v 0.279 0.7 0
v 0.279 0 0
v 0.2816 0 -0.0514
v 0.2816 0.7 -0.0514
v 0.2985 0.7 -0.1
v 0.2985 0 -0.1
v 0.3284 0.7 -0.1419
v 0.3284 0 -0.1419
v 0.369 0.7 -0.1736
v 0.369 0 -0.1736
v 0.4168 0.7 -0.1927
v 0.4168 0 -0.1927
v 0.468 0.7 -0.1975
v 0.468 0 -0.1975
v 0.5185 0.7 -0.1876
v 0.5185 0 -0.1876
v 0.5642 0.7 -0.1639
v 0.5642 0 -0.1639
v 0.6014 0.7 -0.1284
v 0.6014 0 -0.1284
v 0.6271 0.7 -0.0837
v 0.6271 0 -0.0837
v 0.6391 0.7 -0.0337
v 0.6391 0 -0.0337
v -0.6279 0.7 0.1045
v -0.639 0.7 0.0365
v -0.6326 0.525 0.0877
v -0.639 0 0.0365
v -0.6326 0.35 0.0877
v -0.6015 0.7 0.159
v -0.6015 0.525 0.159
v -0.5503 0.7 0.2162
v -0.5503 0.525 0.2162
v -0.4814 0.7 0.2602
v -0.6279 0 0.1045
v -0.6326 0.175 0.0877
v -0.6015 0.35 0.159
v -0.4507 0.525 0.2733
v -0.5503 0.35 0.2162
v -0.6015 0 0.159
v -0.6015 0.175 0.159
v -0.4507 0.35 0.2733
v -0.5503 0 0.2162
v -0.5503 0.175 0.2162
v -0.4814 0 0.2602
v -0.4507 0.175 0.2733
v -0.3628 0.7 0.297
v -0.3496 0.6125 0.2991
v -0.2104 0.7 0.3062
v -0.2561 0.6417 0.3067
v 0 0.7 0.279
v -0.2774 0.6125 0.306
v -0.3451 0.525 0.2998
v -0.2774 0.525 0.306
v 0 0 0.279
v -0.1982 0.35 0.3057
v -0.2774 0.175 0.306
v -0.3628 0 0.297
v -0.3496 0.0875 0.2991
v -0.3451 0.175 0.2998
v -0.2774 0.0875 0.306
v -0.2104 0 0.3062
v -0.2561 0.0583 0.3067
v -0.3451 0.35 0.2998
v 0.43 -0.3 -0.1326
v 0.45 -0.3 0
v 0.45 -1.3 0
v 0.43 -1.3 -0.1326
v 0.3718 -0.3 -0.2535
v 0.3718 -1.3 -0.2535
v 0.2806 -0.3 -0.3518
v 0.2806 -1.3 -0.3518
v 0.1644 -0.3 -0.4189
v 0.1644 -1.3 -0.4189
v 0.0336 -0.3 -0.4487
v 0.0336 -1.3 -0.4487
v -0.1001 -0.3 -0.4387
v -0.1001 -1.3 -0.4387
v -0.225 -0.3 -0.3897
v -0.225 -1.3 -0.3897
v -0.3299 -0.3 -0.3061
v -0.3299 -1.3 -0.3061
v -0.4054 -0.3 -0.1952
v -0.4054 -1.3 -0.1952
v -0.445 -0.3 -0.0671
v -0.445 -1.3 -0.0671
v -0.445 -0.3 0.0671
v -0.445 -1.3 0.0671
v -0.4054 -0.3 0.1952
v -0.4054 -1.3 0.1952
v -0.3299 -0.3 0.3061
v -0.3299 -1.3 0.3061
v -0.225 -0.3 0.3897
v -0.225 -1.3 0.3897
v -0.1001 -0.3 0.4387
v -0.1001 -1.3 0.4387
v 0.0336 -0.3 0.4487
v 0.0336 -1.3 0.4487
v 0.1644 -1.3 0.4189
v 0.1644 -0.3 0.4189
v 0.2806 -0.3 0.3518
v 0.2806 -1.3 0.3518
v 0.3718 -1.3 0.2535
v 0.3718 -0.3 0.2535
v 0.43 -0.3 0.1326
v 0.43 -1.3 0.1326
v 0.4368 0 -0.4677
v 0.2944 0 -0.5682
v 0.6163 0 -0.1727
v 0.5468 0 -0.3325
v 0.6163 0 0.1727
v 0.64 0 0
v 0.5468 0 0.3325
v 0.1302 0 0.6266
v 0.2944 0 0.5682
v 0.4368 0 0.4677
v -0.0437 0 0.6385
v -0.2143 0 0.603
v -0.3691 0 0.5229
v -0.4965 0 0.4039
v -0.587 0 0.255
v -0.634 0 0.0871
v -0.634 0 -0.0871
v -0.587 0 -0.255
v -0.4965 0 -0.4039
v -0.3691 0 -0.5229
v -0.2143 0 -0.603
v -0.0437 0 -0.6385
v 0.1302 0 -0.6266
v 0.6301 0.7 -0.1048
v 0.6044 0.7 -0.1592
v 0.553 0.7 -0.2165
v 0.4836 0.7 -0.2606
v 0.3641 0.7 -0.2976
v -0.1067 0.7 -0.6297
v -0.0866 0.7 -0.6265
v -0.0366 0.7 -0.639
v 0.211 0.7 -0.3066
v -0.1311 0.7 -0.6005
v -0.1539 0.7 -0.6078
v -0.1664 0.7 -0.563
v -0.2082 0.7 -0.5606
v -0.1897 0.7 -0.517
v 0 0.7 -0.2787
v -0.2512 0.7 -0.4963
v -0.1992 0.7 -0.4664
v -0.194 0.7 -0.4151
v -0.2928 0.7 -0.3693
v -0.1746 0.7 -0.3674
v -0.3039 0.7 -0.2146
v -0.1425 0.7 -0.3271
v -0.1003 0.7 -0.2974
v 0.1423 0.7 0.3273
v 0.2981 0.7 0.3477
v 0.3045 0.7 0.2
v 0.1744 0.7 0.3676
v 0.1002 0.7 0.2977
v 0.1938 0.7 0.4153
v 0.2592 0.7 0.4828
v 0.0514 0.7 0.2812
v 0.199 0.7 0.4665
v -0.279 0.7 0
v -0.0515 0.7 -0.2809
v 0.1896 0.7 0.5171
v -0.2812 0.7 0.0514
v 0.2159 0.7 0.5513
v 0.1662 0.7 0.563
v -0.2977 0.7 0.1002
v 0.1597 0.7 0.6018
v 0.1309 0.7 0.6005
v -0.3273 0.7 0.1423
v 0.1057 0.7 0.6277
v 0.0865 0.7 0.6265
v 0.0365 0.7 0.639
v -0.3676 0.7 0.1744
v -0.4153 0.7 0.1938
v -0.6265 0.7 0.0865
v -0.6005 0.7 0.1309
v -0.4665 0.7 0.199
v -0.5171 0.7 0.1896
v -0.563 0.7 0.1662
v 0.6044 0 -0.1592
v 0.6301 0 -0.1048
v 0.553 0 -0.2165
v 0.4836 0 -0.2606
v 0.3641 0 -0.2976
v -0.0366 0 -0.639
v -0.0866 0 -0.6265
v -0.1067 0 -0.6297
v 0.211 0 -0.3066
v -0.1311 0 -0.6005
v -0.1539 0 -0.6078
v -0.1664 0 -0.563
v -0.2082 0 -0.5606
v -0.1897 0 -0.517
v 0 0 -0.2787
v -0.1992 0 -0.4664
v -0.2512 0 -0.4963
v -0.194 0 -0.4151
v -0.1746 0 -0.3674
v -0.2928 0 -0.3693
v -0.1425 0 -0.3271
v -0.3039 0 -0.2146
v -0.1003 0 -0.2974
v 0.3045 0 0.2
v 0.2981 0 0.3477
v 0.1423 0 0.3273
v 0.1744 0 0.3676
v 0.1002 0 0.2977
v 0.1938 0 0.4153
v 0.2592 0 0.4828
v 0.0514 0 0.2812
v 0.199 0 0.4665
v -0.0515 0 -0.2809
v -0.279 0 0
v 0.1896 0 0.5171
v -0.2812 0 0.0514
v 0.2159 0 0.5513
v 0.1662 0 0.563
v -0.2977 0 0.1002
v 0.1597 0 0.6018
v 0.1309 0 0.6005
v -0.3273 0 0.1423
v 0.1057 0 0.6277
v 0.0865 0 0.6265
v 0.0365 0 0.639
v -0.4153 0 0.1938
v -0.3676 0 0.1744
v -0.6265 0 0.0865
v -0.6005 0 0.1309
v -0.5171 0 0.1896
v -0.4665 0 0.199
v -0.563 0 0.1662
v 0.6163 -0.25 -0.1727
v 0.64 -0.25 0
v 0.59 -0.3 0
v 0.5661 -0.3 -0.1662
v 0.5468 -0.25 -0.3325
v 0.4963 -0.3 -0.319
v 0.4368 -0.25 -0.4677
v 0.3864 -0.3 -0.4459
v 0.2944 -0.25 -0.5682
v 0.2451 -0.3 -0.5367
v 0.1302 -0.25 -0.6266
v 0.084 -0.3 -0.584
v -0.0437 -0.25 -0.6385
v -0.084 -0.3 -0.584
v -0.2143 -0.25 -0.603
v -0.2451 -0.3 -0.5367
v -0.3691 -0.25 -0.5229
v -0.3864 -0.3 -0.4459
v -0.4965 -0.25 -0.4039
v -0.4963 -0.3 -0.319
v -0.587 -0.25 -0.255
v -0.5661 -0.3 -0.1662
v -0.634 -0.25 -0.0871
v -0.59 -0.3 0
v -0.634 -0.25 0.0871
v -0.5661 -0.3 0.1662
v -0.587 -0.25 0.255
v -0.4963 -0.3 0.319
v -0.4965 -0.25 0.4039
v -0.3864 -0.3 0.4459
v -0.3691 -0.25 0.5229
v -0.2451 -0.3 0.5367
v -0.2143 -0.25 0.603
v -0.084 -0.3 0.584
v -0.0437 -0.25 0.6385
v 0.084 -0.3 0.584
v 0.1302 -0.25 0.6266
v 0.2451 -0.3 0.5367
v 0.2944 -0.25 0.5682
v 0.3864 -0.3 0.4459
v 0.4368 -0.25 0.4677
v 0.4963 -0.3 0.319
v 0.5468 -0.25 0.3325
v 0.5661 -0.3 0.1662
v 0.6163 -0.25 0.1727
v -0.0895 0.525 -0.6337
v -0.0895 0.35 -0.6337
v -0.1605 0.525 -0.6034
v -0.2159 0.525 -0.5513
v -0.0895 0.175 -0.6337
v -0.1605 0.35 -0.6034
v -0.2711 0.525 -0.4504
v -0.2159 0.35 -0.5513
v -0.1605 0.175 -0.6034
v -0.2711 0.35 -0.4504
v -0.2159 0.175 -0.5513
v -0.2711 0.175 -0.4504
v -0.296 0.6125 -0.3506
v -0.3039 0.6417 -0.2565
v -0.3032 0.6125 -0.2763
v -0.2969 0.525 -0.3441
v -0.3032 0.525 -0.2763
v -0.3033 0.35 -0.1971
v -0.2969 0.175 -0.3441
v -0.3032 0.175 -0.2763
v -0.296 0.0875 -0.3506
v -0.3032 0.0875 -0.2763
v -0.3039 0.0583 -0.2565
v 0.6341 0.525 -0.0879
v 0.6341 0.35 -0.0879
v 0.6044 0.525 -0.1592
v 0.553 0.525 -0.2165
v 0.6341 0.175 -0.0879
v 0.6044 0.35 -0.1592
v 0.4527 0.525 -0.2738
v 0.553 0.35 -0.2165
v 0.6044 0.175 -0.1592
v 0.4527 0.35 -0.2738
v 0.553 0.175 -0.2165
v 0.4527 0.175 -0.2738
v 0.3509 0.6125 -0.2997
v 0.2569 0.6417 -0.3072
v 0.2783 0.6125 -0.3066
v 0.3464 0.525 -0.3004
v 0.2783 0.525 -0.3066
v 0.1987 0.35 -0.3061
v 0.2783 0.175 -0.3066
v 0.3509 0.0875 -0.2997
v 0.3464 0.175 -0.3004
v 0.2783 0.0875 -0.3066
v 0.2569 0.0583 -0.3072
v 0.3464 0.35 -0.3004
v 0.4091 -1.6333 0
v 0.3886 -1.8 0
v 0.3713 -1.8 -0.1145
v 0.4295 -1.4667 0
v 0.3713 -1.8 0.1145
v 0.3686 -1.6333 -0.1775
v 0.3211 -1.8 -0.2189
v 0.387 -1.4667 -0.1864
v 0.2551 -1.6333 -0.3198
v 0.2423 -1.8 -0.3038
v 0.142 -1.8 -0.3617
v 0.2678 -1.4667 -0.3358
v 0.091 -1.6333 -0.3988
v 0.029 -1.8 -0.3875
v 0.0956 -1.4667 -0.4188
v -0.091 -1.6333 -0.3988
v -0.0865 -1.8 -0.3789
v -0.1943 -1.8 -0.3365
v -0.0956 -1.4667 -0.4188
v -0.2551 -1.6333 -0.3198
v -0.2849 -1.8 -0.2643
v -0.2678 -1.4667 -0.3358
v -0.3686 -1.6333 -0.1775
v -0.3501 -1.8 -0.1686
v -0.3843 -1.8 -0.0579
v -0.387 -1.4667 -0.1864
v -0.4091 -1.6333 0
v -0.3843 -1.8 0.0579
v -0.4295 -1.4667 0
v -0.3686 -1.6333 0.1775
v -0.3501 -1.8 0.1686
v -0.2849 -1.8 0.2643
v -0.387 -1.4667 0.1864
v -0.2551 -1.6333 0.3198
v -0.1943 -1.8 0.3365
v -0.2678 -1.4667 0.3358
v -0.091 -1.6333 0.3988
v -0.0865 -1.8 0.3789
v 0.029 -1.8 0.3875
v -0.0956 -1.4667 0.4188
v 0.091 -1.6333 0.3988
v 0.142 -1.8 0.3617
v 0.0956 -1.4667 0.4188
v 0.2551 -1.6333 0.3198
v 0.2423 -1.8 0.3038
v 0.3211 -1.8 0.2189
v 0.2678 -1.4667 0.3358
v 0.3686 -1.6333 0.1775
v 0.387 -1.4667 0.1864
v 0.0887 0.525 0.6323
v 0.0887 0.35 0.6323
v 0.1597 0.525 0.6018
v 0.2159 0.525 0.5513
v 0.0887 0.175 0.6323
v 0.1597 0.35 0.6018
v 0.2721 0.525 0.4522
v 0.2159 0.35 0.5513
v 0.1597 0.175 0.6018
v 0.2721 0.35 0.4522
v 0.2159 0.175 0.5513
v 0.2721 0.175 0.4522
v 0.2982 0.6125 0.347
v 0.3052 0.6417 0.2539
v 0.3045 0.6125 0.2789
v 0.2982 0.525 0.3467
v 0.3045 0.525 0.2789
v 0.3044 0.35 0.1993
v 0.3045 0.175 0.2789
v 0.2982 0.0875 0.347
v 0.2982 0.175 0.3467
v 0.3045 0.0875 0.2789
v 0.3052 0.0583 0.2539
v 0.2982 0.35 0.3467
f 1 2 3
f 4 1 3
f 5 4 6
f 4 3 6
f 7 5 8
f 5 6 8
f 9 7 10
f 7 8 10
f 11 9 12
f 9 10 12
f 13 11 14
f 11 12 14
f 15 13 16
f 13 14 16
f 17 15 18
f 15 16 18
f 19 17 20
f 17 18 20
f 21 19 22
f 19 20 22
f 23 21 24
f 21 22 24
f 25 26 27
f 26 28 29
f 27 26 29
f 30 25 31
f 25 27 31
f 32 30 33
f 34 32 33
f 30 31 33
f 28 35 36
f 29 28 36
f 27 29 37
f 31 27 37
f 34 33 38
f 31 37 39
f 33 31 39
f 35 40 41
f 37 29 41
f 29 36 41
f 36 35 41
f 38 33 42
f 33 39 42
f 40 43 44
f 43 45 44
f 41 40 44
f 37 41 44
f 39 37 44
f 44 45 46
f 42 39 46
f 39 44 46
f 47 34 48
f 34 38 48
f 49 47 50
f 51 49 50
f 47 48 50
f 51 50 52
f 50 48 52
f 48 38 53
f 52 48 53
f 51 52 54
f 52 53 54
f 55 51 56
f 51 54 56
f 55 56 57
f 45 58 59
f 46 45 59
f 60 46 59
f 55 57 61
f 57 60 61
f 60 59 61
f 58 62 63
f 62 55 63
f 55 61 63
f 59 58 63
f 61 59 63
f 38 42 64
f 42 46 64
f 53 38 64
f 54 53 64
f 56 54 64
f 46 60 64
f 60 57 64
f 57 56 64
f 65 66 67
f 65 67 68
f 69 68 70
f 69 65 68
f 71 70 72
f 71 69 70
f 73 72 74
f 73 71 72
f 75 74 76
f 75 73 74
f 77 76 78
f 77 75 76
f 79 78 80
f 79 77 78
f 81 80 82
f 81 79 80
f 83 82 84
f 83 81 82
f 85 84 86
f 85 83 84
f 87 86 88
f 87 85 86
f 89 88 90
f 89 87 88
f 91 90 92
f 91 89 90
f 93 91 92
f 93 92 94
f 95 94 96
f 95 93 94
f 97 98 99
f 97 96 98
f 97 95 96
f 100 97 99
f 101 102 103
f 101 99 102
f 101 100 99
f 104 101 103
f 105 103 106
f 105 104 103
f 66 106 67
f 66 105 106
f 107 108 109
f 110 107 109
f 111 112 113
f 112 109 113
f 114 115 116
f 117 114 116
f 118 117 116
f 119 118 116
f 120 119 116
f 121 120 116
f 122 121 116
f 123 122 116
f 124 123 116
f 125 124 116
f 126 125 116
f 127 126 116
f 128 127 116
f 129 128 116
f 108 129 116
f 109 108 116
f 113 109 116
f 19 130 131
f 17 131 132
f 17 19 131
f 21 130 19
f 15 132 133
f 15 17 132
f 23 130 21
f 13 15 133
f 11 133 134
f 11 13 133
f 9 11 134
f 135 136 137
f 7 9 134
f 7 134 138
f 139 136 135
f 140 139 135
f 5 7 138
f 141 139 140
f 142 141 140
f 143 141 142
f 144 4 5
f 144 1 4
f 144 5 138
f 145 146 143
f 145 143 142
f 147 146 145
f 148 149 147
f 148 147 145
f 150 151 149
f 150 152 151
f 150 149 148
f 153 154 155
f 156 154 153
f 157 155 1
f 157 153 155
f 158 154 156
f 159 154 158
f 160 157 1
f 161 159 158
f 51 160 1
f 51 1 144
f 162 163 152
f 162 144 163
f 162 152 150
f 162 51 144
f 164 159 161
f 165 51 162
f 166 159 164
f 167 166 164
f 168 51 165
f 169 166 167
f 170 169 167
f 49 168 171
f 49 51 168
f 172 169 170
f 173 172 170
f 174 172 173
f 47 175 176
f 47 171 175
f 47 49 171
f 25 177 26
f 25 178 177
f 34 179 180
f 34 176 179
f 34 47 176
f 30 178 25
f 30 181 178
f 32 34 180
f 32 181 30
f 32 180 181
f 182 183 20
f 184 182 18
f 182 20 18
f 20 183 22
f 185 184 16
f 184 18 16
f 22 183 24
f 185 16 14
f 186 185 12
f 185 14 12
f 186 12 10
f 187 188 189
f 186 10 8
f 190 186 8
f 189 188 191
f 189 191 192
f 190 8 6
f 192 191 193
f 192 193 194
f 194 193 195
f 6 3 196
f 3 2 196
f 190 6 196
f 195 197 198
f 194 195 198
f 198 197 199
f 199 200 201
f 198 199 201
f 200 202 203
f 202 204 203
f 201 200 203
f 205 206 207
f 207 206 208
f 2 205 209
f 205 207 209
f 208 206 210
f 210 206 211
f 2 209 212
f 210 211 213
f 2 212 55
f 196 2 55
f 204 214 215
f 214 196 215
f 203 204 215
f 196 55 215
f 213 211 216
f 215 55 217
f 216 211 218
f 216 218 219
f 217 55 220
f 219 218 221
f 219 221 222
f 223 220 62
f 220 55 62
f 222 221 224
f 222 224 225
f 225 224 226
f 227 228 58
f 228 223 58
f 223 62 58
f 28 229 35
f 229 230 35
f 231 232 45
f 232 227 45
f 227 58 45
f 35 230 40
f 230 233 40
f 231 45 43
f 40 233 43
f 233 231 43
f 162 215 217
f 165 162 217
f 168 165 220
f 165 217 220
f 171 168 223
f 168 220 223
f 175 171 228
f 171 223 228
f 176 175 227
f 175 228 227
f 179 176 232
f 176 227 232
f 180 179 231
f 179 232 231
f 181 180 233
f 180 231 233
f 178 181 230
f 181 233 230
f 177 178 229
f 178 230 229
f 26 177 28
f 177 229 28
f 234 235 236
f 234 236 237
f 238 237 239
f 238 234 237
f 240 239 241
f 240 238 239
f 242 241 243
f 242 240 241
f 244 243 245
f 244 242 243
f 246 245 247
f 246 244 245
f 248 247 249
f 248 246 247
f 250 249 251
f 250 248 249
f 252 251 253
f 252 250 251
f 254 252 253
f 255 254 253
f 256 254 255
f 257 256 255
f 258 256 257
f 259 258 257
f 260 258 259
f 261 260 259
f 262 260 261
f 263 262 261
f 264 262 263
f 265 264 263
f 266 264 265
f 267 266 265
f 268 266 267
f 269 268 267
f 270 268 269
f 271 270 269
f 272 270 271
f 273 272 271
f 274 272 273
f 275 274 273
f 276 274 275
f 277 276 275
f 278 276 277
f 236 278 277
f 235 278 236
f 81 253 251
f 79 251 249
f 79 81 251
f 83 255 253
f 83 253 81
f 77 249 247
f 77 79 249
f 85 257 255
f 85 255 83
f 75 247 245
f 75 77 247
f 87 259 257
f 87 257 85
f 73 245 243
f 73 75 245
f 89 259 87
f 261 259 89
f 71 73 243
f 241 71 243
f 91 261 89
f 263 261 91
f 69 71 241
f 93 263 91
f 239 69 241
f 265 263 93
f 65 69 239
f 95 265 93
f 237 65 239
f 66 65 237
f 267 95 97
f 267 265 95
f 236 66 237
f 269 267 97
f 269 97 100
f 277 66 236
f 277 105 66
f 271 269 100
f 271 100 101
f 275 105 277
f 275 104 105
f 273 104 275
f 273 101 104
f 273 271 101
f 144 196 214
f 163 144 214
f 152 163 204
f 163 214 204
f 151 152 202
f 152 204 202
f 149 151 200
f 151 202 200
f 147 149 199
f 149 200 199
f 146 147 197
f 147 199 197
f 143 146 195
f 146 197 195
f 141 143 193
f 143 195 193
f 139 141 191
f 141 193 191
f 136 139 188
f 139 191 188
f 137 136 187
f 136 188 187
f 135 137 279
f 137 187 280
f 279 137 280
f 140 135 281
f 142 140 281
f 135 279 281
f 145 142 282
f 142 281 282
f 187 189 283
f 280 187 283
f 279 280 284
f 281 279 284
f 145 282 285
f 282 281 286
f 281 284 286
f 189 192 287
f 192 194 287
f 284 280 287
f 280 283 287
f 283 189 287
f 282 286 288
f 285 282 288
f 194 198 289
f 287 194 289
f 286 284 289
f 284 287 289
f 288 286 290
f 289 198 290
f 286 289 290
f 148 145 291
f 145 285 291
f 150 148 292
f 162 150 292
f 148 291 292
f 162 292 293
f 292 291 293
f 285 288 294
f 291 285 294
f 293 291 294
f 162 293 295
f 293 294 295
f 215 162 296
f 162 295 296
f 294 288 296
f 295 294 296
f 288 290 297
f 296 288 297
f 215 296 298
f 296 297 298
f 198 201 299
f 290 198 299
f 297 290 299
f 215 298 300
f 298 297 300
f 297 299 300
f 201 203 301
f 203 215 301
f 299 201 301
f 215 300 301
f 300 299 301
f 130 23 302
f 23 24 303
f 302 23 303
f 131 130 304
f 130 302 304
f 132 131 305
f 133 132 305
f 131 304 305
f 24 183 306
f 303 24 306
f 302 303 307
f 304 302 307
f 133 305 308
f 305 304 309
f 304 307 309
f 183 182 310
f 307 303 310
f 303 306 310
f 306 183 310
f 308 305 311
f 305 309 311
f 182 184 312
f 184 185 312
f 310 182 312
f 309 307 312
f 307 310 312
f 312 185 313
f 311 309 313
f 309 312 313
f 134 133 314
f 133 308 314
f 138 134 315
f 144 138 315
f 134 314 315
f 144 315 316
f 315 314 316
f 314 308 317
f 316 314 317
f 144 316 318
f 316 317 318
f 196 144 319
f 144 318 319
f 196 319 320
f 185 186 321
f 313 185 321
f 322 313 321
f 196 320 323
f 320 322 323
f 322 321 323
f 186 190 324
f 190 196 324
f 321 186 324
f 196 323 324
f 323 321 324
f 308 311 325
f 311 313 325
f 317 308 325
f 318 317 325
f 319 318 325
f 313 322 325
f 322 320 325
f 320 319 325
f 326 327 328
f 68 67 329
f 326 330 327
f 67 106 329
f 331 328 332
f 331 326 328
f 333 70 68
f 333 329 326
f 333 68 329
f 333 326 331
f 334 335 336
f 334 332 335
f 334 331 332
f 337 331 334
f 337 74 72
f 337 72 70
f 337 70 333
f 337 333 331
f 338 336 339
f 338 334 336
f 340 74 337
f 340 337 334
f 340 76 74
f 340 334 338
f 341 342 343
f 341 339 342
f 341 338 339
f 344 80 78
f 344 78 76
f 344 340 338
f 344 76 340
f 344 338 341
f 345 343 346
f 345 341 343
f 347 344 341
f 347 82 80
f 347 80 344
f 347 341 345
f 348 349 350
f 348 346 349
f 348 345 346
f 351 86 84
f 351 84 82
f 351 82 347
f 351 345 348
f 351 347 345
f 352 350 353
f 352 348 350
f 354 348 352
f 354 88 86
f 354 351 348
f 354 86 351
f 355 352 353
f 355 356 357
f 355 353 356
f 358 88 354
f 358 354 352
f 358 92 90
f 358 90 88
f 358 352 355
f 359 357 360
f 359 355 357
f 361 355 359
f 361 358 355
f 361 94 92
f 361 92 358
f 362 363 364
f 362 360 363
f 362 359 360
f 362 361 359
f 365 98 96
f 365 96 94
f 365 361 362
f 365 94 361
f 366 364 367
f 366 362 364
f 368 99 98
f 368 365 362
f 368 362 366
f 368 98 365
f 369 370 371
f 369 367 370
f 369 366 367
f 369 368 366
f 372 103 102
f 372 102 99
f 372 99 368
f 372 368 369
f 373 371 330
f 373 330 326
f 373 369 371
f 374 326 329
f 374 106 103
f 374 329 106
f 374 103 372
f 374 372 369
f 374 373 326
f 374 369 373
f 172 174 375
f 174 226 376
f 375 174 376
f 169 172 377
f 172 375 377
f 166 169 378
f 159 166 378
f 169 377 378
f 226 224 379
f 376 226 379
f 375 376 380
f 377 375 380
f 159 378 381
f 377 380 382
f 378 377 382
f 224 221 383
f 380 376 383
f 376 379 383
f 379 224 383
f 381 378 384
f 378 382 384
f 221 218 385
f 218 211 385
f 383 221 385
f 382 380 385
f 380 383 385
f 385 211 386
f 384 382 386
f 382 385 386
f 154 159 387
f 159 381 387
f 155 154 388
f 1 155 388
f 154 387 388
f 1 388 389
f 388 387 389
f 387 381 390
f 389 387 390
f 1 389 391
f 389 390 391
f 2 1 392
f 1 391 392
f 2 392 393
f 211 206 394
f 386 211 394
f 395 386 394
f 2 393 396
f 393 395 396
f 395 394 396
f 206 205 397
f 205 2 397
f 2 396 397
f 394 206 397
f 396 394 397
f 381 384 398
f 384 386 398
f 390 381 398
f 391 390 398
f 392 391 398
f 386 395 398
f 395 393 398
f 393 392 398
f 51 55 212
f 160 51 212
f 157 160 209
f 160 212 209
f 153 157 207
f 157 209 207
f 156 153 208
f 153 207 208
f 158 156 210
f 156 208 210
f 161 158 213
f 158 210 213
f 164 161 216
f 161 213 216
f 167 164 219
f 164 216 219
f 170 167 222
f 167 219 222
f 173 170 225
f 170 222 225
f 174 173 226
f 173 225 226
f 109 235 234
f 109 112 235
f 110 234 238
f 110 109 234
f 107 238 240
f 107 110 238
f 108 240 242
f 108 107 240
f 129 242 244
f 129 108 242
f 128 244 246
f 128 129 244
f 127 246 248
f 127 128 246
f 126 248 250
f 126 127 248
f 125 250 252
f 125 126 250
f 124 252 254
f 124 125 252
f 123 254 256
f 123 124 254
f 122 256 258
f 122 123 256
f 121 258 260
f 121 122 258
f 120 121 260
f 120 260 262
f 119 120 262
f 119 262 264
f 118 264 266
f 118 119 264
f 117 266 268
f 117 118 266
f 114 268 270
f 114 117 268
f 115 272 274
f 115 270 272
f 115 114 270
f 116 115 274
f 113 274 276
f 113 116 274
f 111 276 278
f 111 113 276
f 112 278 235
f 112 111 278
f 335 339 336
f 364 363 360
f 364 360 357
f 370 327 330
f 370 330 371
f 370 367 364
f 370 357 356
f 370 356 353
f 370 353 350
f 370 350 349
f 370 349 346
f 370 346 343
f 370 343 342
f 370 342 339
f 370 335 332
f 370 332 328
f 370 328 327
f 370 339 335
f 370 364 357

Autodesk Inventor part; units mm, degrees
ref_plane "YZ Plane" through (0, 0, 0) normal (1, 0, 0) x (0, 1, 0)
ref_plane "XZ Plane" through (0, 0, 0) normal (0, 1, 0) x (-1, 0, 0)
ref_plane "XY Plane" through (0, 0, 0) normal (0, 0, 1) x (1, 0, 0)
sketch "Sketch2" plane through (0, 0, 0) normal (0, 1, 0) x (-1, 0, 0)
  line L0 (-0.279026, 0.279026) -> (0.279026, -0.279026) construction
  line L1 (0.279026, 0.279026) -> (-0.279026, -0.279026) construction
  spline S0 degree 4 poles (-0.639115, -0.03369) (-0.634493, -0.132924) (-0.626677, -0.000796) (-0.683231, -0.424589) (0.000022, -0.278707) knots 0 0 0 0 0 1 1 1 1 1
  spline S1 degree 4 poles (0.036579, -0.638954) (0.128591, -0.633029) (0.015735, -0.629627) (0.410949, -0.676473) (0.279026, 0) knots 0 0 0 0 0 1 1 1 1 1
  spline S2 degree 4 poles (-0.036525, 0.638959) (-0.129118, 0.634798) (-0.010002, 0.617131) (-0.415936, 0.686883) (-0.279026, 0) knots 0 0 0 0 0 1 1 1 1 1
  spline S3 degree 4 poles (0.638959, 0.036525) (0.634795, 0.128622) (0.619543, 0.004623) (0.682049, 0.421677) (0, 0.279026) knots 0 0 0 0 0 1 1 1 1 1
  arc A0 (-0.639115, -0.03369) -> (-0.279026, 0) centre (-0.45907, -0.016845) ccw
  arc A1 (0.036579, -0.638954) -> (0.000022, -0.278707) centre (0.0183, -0.45883) ccw
  arc A2 (0.638959, 0.036525) -> (0.279026, 0) centre (0.458993, 0.018263) ccw
  arc A3 (-0.036525, 0.638959) -> (0, 0.279026) centre (-0.018263, 0.458993) ccw
  circle A4 centre (0, 0) radius 0.64
  point P0 (0.072027, -0.636054)
  point P1 (0.088403, -0.633939)
  point P2 (0.119628, -0.625229)
  point P3 (-0.071713, 0.635654)
  point P4 (-0.087466, 0.632637)
  point P5 (-0.11823, 0.62326)
  point P6 (0.635846, 0.070961)
  point P7 (0.633021, 0.08595)
  point P8 (0.62382, 0.11598)
  point P9 (-0.636387, -0.071601)
  point P10 (-0.634237, -0.087213)
  point P11 (-0.625654, -0.117837)
  dimension "d14" = 1.28
sketch "Sketch2 outline for Extrusion1" plane through (0, 0, 0) normal (0, 1, 0) x (-1, 0, 0)
  arc A0 (-0.639115, -0.03369) -> (-0.279026, 0) centre (-0.45907, -0.016845) ccw
  spline S0 degree 4 poles (-0.036525, 0.638959) (-0.129118, 0.634798) (-0.010002, 0.617131) (-0.415936, 0.686883) (-0.279026, 0) knots 0 0 0 0 0 1 1 1 1 1
  arc A1 (-0.036525, 0.638959) -> (0, 0.279026) centre (-0.018263, 0.458993) ccw
  spline S1 degree 4 poles (0.638959, 0.036525) (0.634795, 0.128622) (0.619543, 0.004623) (0.682049, 0.421677) (0, 0.279026) knots 0 0 0 0 0 1 1 1 1 1
  arc A2 (0.638959, 0.036525) -> (0.279026, 0) centre (0.458993, 0.018263) ccw
  spline S2 degree 4 poles (0.036579, -0.638954) (0.128591, -0.633029) (0.015735, -0.629627) (0.410949, -0.676473) (0.279026, 0) knots 0 0 0 0 0 1 1 1 1 1
  arc A3 (0.036579, -0.638954) -> (0.000022, -0.278707) centre (0.0183, -0.45883) ccw
  spline S3 degree 4 poles (-0.639115, -0.03369) (-0.634493, -0.132924) (-0.626677, -0.000796) (-0.683231, -0.424589) (0.000022, -0.278707) knots 0 0 0 0 0 1 1 1 1 1
extrude "Extrusion1" add sketch "Sketch2 outline for Extrusion1" along normal blind 0.7
sketch "Sketch5" plane through (0, 0, 0) normal (0, -1, 0) x (1, 0, 0)
  circle A0 centre (0.000002, 0) radius 0.64
  point P0 (0.639115, -0.03369)
  dimension "d15" = 1.28
extrude "Extrusion2" add sketch "Sketch5" along normal blind 0.3 separate body
sketch "Sketch6" plane through (0.000002, -0.3, 0) normal (0, -1, 0) x (1, 0, 0)
  circle A0 centre (-0.000002, 0) radius 0.45
  circle A1 centre (-0.000002, 0) radius 0.25
  dimension "d6" = 0.5
  dimension "d7" = 0.9
extrude "Extrusion3" add sketch "Sketch6" along normal blind 1.5 contours A0 | A1 bodies 2
chamfer "Chanfrein1" distance 0.5 angle 7 1 edges at (-0.45, -1.8, 0) measured on face at (0.4485, -1.3, -0.0362)
chamfer "Chanfrein2" distance 0.05 angle 45 1 edges at (-0.64, -0.3, 0)
properties part number "1.3mm_uncorrected"
